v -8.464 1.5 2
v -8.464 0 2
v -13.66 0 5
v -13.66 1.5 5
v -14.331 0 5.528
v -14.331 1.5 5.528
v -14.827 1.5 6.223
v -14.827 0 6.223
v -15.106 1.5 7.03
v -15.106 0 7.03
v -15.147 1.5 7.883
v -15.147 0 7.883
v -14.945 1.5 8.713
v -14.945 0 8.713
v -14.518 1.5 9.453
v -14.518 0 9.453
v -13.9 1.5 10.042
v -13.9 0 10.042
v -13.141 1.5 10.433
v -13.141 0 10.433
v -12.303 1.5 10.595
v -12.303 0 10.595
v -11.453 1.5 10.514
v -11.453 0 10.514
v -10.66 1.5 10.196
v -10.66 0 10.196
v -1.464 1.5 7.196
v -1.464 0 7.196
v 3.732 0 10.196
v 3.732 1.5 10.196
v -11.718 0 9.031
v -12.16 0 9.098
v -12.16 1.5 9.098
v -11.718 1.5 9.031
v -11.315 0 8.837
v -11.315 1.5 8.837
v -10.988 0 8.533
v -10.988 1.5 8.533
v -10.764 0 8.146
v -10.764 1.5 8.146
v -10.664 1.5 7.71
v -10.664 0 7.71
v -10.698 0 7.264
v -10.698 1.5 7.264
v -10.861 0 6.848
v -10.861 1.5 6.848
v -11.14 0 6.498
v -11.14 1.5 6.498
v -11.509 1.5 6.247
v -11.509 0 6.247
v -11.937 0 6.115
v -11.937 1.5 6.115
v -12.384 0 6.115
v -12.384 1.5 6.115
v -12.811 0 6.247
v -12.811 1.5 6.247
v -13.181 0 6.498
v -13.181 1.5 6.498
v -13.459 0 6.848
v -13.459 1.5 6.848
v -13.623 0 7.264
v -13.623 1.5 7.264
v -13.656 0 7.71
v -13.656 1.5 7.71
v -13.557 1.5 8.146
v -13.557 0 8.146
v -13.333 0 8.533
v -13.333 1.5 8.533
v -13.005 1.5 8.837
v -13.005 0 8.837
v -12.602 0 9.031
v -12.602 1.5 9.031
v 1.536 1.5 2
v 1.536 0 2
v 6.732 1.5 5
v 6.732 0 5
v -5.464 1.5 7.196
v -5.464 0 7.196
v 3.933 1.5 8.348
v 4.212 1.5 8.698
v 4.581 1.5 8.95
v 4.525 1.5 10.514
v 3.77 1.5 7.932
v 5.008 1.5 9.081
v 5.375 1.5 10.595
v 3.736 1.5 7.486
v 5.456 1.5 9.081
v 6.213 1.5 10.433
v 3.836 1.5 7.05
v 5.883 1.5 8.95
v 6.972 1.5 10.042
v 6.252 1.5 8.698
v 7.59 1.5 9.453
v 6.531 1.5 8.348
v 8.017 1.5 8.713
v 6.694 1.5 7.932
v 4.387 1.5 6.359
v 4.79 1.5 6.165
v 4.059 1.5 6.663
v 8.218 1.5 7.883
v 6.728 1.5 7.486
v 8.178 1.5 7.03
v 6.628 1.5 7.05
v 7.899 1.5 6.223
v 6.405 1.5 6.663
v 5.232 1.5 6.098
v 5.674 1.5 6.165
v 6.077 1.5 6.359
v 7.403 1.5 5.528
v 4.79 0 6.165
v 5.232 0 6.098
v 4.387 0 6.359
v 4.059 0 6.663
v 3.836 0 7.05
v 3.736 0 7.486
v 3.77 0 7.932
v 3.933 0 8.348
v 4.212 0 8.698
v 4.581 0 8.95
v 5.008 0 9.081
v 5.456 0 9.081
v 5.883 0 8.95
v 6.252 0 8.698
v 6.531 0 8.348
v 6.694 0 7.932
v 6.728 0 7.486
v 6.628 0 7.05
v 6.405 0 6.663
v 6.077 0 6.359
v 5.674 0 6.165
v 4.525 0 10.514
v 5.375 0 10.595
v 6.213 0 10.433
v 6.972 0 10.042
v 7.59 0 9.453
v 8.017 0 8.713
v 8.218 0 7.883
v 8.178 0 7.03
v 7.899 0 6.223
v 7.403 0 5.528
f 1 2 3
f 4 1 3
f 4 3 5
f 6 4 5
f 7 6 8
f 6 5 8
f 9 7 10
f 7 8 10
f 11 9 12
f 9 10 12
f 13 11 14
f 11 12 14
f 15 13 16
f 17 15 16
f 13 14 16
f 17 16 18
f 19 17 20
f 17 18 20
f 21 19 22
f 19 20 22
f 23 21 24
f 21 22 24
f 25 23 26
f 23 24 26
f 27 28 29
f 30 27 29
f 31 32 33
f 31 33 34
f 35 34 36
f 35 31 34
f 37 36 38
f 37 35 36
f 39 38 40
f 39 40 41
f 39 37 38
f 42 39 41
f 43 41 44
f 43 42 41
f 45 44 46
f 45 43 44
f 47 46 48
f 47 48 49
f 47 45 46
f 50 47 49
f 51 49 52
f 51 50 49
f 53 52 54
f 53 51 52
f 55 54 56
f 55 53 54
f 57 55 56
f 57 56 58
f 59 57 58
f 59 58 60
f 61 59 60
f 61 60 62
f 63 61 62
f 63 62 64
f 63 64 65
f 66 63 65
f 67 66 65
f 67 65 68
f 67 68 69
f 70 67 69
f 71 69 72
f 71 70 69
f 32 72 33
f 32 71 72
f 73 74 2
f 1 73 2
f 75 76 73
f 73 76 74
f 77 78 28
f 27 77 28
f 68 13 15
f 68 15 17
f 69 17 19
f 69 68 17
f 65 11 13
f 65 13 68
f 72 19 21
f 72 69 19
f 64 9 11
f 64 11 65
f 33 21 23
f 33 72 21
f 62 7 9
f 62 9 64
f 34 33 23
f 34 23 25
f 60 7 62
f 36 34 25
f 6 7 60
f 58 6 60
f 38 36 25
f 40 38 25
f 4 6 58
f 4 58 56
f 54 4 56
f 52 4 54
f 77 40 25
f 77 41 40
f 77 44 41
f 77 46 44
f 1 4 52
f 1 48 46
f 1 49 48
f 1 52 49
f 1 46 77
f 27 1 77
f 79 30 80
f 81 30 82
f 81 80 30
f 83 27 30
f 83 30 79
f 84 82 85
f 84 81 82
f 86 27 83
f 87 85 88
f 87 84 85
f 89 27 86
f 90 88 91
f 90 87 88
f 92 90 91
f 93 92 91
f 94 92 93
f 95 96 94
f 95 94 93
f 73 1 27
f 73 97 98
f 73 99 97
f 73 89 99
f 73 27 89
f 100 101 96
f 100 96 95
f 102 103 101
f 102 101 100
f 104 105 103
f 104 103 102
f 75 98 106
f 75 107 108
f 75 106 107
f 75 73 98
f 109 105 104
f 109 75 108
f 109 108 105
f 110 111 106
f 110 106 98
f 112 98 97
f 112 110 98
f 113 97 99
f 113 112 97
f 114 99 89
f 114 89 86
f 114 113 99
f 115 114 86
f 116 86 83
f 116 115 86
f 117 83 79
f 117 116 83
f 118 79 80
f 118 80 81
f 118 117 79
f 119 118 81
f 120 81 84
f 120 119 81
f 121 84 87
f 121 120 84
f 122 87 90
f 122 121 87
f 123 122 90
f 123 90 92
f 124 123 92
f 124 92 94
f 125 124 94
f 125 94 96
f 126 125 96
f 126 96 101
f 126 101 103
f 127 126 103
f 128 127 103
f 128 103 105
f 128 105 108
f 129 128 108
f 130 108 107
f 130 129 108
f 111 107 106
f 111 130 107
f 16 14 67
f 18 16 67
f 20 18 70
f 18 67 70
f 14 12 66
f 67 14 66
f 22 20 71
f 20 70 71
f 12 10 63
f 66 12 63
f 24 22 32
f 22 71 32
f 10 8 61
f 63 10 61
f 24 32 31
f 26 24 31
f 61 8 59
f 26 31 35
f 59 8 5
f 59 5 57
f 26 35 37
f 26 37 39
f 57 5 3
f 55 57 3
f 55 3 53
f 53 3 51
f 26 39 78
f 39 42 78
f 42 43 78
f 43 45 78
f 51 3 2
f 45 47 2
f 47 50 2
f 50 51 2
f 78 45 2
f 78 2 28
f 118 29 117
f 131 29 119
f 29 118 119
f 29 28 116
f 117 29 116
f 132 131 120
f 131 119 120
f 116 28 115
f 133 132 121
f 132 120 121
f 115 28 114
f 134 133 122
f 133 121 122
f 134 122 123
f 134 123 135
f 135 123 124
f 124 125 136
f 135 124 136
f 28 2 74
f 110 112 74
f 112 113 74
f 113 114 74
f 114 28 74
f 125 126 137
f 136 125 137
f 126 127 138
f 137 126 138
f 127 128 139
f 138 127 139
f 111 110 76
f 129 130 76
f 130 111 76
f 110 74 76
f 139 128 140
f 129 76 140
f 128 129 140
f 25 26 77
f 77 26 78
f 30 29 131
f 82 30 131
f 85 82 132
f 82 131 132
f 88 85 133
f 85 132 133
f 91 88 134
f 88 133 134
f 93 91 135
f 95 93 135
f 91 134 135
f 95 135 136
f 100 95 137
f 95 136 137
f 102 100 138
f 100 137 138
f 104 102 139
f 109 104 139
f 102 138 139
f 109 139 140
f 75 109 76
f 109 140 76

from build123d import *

# Parameters (mm, degrees)
SKETCH1_R           = 1.5
BOSS_EXTRUDE1_DEPTH = 1.5


with BuildPart() as part:
    # Sketch1 → Boss-Extrude1 (new body)
    with BuildSketch(Plane(origin=(0, 0, 0), x_dir=(1, 0, 0), z_dir=(0, 1, 0))):
        with BuildLine():
            Line((-8.464101615, -2), (-13.660254038, -5))
            ThreePointArc((-13.660254038, -5), (-14.758330249, -9.098076211), (-10.660254038, -10.196152423))
            Line((-10.660254038, -10.196152423), (-5.464101615, -7.196152423))
            Line((-5.464101615, -7.196152423), (-1.464101615, -7.196152423))
            Line((-1.464101615, -7.196152423), (3.732050808, -10.196152423))
            ThreePointArc((3.732050808, -10.196152423), (7.830127019, -9.098076211), (6.732050808, -5))
            Line((6.732050808, -5), (1.535898385, -2))
            Line((1.535898385, -2), (-8.464101615, -2))
        make_face()
        with Locations(Location((-12.160254038, -7.598076211, 0), (0, 0, 270))):
            Circle(SKETCH1_R, mode=Mode.SUBTRACT)
        with Locations(Location((5.232050808, -7.598076211, 0), (0, 0, 90))):
            Circle(SKETCH1_R, mode=Mode.SUBTRACT)
    extrude(amount=BOSS_EXTRUDE1_DEPTH)


solid = part.part
